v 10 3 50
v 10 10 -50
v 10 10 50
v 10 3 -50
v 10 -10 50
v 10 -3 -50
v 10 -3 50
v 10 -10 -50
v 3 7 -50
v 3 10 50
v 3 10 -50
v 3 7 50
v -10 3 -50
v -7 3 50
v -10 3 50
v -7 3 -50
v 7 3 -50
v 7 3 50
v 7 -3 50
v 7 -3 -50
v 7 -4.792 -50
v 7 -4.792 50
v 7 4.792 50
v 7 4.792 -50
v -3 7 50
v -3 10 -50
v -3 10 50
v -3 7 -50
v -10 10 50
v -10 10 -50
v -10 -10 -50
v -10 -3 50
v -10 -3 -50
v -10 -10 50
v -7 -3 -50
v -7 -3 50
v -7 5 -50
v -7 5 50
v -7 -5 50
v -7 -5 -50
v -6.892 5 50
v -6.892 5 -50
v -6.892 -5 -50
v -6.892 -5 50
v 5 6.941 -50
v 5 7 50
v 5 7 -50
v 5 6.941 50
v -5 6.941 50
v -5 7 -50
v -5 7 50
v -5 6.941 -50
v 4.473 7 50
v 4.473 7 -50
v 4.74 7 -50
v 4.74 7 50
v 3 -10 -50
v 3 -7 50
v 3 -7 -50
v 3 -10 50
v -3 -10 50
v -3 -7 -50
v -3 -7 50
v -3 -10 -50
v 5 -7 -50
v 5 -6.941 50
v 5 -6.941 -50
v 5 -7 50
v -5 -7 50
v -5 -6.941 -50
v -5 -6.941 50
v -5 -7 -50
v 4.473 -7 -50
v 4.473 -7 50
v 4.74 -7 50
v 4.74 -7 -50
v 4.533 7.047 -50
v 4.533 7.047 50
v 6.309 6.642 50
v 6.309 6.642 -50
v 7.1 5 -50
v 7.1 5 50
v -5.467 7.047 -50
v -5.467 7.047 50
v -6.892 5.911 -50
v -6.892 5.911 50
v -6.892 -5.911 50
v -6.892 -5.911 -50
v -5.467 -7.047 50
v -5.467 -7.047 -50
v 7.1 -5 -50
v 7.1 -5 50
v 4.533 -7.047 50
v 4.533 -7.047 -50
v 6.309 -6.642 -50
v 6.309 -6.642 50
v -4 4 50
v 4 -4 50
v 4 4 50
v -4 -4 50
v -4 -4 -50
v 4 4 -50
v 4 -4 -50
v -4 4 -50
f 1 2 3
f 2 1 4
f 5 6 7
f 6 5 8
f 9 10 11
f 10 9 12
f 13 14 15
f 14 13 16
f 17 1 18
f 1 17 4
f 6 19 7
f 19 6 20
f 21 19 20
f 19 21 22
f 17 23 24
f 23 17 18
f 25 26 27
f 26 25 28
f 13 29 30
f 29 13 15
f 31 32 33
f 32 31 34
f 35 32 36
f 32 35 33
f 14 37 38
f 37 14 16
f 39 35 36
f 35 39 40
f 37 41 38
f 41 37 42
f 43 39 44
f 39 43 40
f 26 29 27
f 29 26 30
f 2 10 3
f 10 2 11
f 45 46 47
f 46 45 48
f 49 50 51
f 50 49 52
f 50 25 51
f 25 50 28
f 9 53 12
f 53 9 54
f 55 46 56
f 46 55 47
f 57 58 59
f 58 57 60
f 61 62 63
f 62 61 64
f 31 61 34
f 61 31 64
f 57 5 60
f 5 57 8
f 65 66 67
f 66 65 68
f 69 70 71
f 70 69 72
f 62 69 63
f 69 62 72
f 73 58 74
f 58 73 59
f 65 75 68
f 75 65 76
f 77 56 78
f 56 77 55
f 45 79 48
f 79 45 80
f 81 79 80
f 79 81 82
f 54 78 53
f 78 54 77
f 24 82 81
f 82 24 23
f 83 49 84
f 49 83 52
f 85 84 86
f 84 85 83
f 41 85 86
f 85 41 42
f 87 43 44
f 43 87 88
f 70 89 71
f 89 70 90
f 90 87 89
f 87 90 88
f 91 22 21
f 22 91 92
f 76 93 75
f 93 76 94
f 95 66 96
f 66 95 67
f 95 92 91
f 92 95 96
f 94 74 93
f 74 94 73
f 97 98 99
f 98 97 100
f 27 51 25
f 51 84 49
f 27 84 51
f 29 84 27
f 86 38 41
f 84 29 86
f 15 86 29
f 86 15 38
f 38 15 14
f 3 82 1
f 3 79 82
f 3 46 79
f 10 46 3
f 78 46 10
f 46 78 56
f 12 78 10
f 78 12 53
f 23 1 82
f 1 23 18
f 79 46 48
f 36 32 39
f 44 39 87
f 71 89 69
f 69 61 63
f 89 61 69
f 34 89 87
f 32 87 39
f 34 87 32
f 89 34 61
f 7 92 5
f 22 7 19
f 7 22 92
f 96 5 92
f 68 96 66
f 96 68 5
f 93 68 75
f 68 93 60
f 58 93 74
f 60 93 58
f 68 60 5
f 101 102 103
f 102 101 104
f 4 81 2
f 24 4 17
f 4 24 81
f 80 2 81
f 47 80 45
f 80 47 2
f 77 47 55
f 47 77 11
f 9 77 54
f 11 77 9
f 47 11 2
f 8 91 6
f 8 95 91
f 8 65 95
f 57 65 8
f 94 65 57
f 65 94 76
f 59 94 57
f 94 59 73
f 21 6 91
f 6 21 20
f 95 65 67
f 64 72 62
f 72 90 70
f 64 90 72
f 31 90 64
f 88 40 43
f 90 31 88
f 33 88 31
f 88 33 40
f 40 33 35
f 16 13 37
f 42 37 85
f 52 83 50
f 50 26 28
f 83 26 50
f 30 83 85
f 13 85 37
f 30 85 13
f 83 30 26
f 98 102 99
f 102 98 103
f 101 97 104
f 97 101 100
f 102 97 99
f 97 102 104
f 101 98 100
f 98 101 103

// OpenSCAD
// Parameters
cross_section_width = 20; //[10:40:0.5]
cross_section_height = 20; //[10:40:0.5]
length = 100; //[50:200:1]
center = 1; //[0:1:1]
cornerHole = 1; //[0:1:1]
wall_thickness = 2; //[1:4:0.25]
slot_opening_width = 6; //[4:10:0.25]
slot_depth = 6; //[3:10:0.25]
slot_cavity_width = 10; //[6:14:0.25]
slot_cavity_depth = 3; //[1.5:6:0.25]
center_bore_diameter = 5; //[3:10:0.25]
corner_hole_diameter = 4.2; //[0:8:0.1]
corner_hole_inset = 5; //[3:8:0.25]
overlap = 1; //[0.5:2:0.25]

// Extrusion - complete geometry
module extrusion() {
  color("Silver") {
    difference() {
      // Main extrusion body
      cube([cross_section_width, cross_section_height, length], center=true);
      
      // T-slot channels
      union() {
        translate([cross_section_width/2 - (slot_depth + overlap)/2, 0, 0])
          cube([slot_depth + overlap, slot_opening_width, length + 2*overlap], center=true);
        translate([cross_section_width/2 - slot_depth + slot_cavity_depth/2 - overlap/2, 0, 0])
          cube([slot_cavity_depth + overlap, slot_cavity_width, length + 2*overlap], center=true);
        translate([-(cross_section_width/2 - (slot_depth + overlap)/2), 0, 0])
          cube([slot_depth + overlap, slot_opening_width, length + 2*overlap], center=true);
        translate([-(cross_section_width/2 - slot_depth + slot_cavity_depth/2 - overlap/2), 0, 0])
          cube([slot_cavity_depth + overlap, slot_cavity_width, length + 2*overlap], center=true);
        translate([0, cross_section_height/2 - (slot_depth + overlap)/2, 0])
          cube([slot_opening_width, slot_depth + overlap, length + 2*overlap], center=true);
        translate([0, cross_section_height/2 - slot_depth + slot_cavity_depth/2 - overlap/2, 0])
          cube([slot_cavity_width, slot_cavity_depth + overlap, length + 2*overlap], center=true);
        translate([0, -(cross_section_height/2 - (slot_depth + overlap)/2), 0])
          cube([slot_opening_width, slot_depth + overlap, length + 2*overlap], center=true);
        translate([0, -(cross_section_height/2 - slot_depth + slot_cavity_depth/2 - overlap/2), 0])
          cube([slot_cavity_width, slot_cavity_depth + overlap, length + 2*overlap], center=true);
      }
      
      // Center bore
      translate([0, 0, 0])
        cylinder(r=center_bore_diameter/2, h=length + 2*overlap, center=true);
      
      // Corner holes
      if (cornerHole) {
        union() {
          translate([cross_section_width/2 - corner_hole_inset, cross_section_height/2 - corner_hole_inset, 0])
            cylinder(r=corner_hole_diameter/2, h=length + 2*overlap, center=true);
          translate([-(cross_section_width/2 - corner_hole_inset), cross_section_height/2 - corner_hole_inset, 0])
            cylinder(r=corner_hole_diameter/2, h=length + 2*overlap, center=true);
          translate([-(cross_section_width/2 - corner_hole_inset), -(cross_section_height/2 - corner_hole_inset), 0])
            cylinder(r=corner_hole_diameter/2, h=length + 2*overlap, center=true);
          translate([cross_section_width/2 - corner_hole_inset, -(cross_section_height/2 - corner_hole_inset), 0])
            cylinder(r=corner_hole_diameter/2, h=length + 2*overlap, center=true);
        }
      }
    }
  }
}

// Extrusion Cross Section - detailed geometry
module extrusion_cross_section() {
  color("DimGray") {
    difference() {
      // Main extrusion body
      cube([cross_section_width, cross_section_height, length], center=true);
      
      // T-slot channels
      union() {
        translate([cross_section_width/2 - (slot_depth + overlap)/2, 0, 0])
          cube([slot_depth + overlap, slot_opening_width, length + 2*overlap], center=true);
        translate([cross_section_width/2 - slot_depth + slot_cavity_depth/2 - overlap/2, 0, 0])
          cube([slot_cavity_depth + overlap, slot_cavity_width, length + 2*overlap], center=true);
        translate([-(cross_section_width/2 - (slot_depth + overlap)/2), 0, 0])
          cube([slot_depth + overlap, slot_opening_width, length + 2*overlap], center=true);
        translate([-(cross_section_width/2 - slot_depth + slot_cavity_depth/2 - overlap/2), 0, 0])
          cube([slot_cavity_depth + overlap, slot_cavity_width, length + 2*overlap], center=true);
        translate([0, cross_section_height/2 - (slot_depth + overlap)/2, 0])
          cube([slot_opening_width, slot_depth + overlap, length + 2*overlap], center=true);
        translate([0, cross_section_height/2 - slot_depth + slot_cavity_depth/2 - overlap/2, 0])
          cube([slot_cavity_width, slot_cavity_depth + overlap, length + 2*overlap], center=true);
        translate([0, -(cross_section_height/2 - (slot_depth + overlap)/2), 0])
          cube([slot_opening_width, slot_depth + overlap, length + 2*overlap], center=true);
        translate([0, -(cross_section_height/2 - slot_depth + slot_cavity_depth/2 - overlap/2), 0])
          cube([slot_cavity_width, slot_cavity_depth + overlap, length + 2*overlap], center=true);
      }
      
      // Center bore
      translate([0, 0, 0])
        cylinder(r=center_bore_diameter/2, h=length + 2*overlap, center=true);
      
      // Corner holes
      if (cornerHole) {
        union() {
          translate([cross_section_width/2 - corner_hole_inset, cross_section_height/2 - corner_hole_inset, 0])
            cylinder(r=corner_hole_diameter/2, h=length + 2*overlap, center=true);
          translate([-(cross_section_width/2 - corner_hole_inset), cross_section_height/2 - corner_hole_inset, 0])
            cylinder(r=corner_hole_diameter/2, h=length + 2*overlap, center=true);
          translate([-(cross_section_width/2 - corner_hole_inset), -(cross_section_height/2 - corner_hole_inset), 0])
            cylinder(r=corner_hole_diameter/2, h=length + 2*overlap, center=true);
          translate([cross_section_width/2 - corner_hole_inset, -(cross_section_height/2 - corner_hole_inset), 0])
            cylinder(r=corner_hole_diameter/2, h=length + 2*overlap, center=true);
        }
      }
    }
  }
}

// Box Corner Profile Section - detailed geometry
module box_corner_profile_section() {
  color("Black") {
    cube([cross_section_width/2 - wall_thickness, cross_section_height/2 - wall_thickness, length], center=true);
  }
}

// Box Corner Profile Sections - detailed geometry
module box_corner_profile_sections() {
  color("Black") {
    union() {
      box_corner_profile_section();
      mirror([1, 0, 0]) box_corner_profile_section();
      mirror([0, 1, 0]) box_corner_profile_section();
      mirror([1, 1, 0]) box_corner_profile_section();
    }
  }
}

// Assembly
module assembly() {
  extrusion();
  extrusion_cross_section();
  box_corner_profile_sections();
}

assembly();
